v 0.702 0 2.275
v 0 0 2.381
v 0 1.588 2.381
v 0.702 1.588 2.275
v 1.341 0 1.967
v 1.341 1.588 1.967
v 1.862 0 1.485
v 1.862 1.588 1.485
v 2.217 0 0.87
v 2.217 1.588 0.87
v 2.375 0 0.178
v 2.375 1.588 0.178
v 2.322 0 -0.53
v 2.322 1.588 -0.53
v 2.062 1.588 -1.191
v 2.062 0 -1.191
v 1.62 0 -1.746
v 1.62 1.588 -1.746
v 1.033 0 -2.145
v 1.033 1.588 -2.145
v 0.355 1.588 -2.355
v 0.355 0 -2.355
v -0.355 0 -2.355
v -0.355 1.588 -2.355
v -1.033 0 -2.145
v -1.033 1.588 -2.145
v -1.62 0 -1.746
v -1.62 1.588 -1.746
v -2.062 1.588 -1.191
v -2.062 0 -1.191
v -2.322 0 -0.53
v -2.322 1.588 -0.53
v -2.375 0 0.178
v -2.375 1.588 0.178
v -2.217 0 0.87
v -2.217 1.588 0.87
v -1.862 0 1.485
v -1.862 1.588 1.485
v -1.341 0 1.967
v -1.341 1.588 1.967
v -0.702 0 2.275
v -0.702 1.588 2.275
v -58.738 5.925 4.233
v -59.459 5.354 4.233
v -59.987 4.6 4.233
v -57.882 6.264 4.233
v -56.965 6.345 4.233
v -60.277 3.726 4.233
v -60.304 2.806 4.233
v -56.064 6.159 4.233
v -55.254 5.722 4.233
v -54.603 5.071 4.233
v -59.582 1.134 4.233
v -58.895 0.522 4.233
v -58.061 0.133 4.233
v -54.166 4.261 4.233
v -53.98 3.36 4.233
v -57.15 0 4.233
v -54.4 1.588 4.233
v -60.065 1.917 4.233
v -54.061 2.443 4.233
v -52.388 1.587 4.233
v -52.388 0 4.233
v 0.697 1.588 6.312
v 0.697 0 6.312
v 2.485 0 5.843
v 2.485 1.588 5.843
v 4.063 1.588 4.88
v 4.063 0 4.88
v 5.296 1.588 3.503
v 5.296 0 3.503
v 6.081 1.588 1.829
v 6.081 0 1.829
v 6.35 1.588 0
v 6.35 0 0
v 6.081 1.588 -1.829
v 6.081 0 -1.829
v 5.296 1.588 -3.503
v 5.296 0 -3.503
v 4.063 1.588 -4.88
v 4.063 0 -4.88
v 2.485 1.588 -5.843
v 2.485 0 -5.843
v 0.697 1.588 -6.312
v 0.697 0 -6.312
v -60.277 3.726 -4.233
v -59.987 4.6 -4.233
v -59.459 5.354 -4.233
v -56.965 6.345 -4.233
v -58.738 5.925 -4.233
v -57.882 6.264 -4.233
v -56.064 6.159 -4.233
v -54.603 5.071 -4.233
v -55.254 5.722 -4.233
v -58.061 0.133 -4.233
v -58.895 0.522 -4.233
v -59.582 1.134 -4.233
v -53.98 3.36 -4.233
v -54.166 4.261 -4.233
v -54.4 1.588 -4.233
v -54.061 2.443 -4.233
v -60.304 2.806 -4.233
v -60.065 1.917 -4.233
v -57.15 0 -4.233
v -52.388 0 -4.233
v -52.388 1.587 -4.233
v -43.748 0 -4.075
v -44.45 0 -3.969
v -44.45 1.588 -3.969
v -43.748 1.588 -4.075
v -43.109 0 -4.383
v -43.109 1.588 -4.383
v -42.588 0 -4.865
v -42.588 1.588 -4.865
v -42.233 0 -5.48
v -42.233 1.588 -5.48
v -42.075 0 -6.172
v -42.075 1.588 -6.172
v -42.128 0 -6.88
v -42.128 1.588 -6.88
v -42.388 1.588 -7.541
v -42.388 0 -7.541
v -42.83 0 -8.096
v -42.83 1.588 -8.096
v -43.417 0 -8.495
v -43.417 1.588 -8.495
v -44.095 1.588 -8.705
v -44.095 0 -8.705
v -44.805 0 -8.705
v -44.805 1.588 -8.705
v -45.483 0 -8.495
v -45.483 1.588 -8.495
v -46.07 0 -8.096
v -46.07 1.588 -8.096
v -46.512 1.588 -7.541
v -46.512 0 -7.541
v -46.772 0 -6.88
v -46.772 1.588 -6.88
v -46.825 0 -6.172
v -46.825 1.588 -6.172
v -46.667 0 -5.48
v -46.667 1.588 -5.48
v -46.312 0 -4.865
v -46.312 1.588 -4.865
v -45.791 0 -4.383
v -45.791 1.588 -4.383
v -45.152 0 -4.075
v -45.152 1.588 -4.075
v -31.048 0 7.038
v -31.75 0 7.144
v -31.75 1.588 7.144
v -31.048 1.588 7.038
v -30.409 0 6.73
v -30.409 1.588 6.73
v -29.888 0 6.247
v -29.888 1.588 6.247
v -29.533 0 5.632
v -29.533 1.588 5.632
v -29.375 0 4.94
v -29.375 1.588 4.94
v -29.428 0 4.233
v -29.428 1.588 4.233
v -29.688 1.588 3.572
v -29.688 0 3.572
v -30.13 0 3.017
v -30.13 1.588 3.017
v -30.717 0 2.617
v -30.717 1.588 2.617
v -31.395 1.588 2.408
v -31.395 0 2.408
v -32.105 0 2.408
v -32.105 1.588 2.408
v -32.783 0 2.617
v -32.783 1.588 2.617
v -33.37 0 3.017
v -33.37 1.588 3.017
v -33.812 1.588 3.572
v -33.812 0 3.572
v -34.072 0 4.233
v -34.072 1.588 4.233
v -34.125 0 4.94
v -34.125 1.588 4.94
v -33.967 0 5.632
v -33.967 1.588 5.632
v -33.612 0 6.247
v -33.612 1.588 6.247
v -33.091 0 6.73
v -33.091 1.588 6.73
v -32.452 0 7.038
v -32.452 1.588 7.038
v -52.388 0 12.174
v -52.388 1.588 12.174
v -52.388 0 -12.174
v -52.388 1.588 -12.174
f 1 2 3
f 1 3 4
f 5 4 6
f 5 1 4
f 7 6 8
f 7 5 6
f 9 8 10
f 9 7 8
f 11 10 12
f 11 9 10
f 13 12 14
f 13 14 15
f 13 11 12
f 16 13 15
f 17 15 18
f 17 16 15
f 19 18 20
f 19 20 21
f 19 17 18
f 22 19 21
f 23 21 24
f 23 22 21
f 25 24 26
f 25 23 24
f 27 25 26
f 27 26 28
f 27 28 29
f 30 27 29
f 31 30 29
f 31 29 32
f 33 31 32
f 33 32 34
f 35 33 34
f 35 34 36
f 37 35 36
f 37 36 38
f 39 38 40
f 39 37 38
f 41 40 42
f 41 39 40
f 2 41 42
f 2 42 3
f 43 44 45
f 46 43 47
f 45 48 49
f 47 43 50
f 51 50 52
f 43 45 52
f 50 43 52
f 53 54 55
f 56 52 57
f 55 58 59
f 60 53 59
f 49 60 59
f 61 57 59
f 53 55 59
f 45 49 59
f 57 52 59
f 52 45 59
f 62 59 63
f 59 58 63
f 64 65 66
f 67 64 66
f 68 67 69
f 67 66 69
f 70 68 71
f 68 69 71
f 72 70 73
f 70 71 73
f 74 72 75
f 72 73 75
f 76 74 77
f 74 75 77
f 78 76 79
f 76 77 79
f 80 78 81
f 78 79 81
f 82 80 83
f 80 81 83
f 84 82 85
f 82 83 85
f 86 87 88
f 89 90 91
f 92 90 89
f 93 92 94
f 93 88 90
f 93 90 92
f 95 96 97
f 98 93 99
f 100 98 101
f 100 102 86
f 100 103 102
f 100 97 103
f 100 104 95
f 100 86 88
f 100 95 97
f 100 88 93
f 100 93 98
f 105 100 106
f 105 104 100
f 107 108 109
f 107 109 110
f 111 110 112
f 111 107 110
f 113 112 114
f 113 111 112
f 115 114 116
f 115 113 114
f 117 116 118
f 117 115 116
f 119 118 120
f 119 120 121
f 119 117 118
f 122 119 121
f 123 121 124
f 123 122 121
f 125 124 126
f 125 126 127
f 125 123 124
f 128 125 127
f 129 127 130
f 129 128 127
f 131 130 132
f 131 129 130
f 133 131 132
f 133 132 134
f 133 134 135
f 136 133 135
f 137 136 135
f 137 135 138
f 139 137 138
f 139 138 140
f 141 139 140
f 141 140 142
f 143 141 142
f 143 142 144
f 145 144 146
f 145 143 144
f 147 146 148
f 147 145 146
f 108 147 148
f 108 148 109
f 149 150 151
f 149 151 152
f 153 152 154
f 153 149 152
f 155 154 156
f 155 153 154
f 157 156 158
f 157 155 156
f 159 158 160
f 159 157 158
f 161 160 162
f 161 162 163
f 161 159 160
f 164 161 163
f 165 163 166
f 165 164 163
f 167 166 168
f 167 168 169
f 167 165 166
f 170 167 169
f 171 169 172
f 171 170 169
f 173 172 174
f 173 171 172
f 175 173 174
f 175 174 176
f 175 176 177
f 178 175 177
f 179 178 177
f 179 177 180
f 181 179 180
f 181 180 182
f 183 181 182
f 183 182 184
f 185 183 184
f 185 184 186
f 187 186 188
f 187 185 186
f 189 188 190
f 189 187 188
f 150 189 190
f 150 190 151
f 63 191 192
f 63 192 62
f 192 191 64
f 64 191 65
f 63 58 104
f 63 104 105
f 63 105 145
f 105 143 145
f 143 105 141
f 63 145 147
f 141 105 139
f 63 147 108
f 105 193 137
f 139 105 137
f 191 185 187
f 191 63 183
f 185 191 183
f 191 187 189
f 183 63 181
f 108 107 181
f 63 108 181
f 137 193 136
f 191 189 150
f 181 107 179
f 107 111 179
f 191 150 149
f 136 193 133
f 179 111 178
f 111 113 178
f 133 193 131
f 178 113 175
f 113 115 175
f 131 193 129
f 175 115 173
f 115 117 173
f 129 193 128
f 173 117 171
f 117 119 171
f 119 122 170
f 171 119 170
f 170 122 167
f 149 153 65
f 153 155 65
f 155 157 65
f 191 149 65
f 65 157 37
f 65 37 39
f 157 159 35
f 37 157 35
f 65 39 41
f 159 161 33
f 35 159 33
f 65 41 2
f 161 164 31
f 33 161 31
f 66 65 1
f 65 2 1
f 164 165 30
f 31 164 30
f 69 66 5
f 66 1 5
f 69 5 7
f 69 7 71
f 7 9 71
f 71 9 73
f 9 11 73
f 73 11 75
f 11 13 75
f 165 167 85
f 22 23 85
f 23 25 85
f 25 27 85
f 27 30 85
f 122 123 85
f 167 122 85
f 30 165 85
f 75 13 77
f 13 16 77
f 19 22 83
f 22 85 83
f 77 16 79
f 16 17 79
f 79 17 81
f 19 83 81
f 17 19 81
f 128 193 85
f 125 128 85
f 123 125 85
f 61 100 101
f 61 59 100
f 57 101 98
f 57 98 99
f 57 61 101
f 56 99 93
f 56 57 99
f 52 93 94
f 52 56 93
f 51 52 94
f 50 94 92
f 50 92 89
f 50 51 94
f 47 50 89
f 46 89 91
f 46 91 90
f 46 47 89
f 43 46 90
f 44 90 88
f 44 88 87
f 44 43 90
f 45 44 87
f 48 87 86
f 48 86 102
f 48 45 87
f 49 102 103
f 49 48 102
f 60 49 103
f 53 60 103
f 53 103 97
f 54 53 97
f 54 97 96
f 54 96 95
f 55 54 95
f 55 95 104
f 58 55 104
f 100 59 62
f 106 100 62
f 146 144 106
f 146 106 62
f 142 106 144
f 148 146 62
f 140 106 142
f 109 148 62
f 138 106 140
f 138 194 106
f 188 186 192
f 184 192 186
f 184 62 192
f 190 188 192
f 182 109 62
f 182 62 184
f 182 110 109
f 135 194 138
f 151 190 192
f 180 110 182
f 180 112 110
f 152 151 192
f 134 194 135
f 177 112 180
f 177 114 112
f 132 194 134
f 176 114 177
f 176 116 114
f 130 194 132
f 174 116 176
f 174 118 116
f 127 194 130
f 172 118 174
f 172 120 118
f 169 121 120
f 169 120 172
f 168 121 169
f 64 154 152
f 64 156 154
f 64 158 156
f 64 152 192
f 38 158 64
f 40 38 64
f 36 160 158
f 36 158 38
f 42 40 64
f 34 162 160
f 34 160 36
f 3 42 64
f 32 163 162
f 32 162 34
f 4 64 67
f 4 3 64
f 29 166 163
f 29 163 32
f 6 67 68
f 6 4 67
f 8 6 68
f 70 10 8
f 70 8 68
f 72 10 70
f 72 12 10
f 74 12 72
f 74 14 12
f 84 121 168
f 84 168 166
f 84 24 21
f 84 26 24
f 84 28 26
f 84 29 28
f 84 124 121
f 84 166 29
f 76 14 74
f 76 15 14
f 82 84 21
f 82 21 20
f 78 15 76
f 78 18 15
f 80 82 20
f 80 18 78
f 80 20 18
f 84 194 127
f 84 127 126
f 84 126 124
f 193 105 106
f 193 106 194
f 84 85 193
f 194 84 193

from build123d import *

# Parameters (mm, degrees)
SKETCH1_R               = 2.38125
BOSS_EXTRUDE1_DEPTH     = 1.5875
SKETCH2_W               = 25.4
SKETCH2_H               = 3.175
CUT_EXTRUDE1_DEPTH      = 62.831036149
CUT_EXTRUDE1_DEPTH_BACK = 62.831036149
SKETCH3_W               = 7.9375
SKETCH3_H               = 8.466666667


with BuildPart() as part:
    # Sketch1 → Boss-Extrude1 (new body)
    with BuildSketch(Plane(origin=(0, 0, 0), x_dir=(1, 0, 0), z_dir=(0, 1, 0))):
        with BuildLine():
            Line((-57.15, 12.7), (-57.15, -12.7))
            Line((-57.15, -12.7), (0.697028502, -6.311628258))
            ThreePointArc((0.697028502, -6.311628258), (6.35, 0), (0.697028502, 6.311628258))
            Line((0.697028502, 6.311628258), (-57.15, 12.7))
        make_face()
        with Locations(Location((0, 0, 0), (0, 0, 270))):
            Circle(SKETCH1_R, mode=Mode.SUBTRACT)
        with Locations(Location((-44.45, 6.35, 0), (0, 0, 270))):
            Circle(SKETCH1_R, mode=Mode.SUBTRACT)
        with Locations(Location((-31.75, -4.7625, 0), (0, 0, 270))):
            Circle(SKETCH1_R, mode=Mode.SUBTRACT)
    extrude(amount=BOSS_EXTRUDE1_DEPTH)

    # Sketch2 → Revolve1 (revolve)
    with BuildSketch(Plane.ZY.offset(57.15)):
        with Locations((0, 1.5875)):
            Rectangle(SKETCH2_W, SKETCH2_H)
    revolve(axis=Axis((-57.15, 3.175, -12.7), (0, 0, 1)))

    # Sketch3 → Cut-Extrude1 (cut, two sides: drawn at the far end of the back side and taken through both)
    with BuildSketch(Plane(origin=(0, 1.5875, 0), x_dir=(1, 0, 0), z_dir=(0, 1, 0)).offset(-CUT_EXTRUDE1_DEPTH_BACK)):
        with Locations((-56.35625, 8.466666667)):
            Rectangle(SKETCH3_W, SKETCH3_H)
        with Locations((-56.35625, -8.466666667)):
            Rectangle(SKETCH3_W, SKETCH3_H)
    extrude(amount=CUT_EXTRUDE1_DEPTH + CUT_EXTRUDE1_DEPTH_BACK, mode=Mode.SUBTRACT)


solid = part.part
